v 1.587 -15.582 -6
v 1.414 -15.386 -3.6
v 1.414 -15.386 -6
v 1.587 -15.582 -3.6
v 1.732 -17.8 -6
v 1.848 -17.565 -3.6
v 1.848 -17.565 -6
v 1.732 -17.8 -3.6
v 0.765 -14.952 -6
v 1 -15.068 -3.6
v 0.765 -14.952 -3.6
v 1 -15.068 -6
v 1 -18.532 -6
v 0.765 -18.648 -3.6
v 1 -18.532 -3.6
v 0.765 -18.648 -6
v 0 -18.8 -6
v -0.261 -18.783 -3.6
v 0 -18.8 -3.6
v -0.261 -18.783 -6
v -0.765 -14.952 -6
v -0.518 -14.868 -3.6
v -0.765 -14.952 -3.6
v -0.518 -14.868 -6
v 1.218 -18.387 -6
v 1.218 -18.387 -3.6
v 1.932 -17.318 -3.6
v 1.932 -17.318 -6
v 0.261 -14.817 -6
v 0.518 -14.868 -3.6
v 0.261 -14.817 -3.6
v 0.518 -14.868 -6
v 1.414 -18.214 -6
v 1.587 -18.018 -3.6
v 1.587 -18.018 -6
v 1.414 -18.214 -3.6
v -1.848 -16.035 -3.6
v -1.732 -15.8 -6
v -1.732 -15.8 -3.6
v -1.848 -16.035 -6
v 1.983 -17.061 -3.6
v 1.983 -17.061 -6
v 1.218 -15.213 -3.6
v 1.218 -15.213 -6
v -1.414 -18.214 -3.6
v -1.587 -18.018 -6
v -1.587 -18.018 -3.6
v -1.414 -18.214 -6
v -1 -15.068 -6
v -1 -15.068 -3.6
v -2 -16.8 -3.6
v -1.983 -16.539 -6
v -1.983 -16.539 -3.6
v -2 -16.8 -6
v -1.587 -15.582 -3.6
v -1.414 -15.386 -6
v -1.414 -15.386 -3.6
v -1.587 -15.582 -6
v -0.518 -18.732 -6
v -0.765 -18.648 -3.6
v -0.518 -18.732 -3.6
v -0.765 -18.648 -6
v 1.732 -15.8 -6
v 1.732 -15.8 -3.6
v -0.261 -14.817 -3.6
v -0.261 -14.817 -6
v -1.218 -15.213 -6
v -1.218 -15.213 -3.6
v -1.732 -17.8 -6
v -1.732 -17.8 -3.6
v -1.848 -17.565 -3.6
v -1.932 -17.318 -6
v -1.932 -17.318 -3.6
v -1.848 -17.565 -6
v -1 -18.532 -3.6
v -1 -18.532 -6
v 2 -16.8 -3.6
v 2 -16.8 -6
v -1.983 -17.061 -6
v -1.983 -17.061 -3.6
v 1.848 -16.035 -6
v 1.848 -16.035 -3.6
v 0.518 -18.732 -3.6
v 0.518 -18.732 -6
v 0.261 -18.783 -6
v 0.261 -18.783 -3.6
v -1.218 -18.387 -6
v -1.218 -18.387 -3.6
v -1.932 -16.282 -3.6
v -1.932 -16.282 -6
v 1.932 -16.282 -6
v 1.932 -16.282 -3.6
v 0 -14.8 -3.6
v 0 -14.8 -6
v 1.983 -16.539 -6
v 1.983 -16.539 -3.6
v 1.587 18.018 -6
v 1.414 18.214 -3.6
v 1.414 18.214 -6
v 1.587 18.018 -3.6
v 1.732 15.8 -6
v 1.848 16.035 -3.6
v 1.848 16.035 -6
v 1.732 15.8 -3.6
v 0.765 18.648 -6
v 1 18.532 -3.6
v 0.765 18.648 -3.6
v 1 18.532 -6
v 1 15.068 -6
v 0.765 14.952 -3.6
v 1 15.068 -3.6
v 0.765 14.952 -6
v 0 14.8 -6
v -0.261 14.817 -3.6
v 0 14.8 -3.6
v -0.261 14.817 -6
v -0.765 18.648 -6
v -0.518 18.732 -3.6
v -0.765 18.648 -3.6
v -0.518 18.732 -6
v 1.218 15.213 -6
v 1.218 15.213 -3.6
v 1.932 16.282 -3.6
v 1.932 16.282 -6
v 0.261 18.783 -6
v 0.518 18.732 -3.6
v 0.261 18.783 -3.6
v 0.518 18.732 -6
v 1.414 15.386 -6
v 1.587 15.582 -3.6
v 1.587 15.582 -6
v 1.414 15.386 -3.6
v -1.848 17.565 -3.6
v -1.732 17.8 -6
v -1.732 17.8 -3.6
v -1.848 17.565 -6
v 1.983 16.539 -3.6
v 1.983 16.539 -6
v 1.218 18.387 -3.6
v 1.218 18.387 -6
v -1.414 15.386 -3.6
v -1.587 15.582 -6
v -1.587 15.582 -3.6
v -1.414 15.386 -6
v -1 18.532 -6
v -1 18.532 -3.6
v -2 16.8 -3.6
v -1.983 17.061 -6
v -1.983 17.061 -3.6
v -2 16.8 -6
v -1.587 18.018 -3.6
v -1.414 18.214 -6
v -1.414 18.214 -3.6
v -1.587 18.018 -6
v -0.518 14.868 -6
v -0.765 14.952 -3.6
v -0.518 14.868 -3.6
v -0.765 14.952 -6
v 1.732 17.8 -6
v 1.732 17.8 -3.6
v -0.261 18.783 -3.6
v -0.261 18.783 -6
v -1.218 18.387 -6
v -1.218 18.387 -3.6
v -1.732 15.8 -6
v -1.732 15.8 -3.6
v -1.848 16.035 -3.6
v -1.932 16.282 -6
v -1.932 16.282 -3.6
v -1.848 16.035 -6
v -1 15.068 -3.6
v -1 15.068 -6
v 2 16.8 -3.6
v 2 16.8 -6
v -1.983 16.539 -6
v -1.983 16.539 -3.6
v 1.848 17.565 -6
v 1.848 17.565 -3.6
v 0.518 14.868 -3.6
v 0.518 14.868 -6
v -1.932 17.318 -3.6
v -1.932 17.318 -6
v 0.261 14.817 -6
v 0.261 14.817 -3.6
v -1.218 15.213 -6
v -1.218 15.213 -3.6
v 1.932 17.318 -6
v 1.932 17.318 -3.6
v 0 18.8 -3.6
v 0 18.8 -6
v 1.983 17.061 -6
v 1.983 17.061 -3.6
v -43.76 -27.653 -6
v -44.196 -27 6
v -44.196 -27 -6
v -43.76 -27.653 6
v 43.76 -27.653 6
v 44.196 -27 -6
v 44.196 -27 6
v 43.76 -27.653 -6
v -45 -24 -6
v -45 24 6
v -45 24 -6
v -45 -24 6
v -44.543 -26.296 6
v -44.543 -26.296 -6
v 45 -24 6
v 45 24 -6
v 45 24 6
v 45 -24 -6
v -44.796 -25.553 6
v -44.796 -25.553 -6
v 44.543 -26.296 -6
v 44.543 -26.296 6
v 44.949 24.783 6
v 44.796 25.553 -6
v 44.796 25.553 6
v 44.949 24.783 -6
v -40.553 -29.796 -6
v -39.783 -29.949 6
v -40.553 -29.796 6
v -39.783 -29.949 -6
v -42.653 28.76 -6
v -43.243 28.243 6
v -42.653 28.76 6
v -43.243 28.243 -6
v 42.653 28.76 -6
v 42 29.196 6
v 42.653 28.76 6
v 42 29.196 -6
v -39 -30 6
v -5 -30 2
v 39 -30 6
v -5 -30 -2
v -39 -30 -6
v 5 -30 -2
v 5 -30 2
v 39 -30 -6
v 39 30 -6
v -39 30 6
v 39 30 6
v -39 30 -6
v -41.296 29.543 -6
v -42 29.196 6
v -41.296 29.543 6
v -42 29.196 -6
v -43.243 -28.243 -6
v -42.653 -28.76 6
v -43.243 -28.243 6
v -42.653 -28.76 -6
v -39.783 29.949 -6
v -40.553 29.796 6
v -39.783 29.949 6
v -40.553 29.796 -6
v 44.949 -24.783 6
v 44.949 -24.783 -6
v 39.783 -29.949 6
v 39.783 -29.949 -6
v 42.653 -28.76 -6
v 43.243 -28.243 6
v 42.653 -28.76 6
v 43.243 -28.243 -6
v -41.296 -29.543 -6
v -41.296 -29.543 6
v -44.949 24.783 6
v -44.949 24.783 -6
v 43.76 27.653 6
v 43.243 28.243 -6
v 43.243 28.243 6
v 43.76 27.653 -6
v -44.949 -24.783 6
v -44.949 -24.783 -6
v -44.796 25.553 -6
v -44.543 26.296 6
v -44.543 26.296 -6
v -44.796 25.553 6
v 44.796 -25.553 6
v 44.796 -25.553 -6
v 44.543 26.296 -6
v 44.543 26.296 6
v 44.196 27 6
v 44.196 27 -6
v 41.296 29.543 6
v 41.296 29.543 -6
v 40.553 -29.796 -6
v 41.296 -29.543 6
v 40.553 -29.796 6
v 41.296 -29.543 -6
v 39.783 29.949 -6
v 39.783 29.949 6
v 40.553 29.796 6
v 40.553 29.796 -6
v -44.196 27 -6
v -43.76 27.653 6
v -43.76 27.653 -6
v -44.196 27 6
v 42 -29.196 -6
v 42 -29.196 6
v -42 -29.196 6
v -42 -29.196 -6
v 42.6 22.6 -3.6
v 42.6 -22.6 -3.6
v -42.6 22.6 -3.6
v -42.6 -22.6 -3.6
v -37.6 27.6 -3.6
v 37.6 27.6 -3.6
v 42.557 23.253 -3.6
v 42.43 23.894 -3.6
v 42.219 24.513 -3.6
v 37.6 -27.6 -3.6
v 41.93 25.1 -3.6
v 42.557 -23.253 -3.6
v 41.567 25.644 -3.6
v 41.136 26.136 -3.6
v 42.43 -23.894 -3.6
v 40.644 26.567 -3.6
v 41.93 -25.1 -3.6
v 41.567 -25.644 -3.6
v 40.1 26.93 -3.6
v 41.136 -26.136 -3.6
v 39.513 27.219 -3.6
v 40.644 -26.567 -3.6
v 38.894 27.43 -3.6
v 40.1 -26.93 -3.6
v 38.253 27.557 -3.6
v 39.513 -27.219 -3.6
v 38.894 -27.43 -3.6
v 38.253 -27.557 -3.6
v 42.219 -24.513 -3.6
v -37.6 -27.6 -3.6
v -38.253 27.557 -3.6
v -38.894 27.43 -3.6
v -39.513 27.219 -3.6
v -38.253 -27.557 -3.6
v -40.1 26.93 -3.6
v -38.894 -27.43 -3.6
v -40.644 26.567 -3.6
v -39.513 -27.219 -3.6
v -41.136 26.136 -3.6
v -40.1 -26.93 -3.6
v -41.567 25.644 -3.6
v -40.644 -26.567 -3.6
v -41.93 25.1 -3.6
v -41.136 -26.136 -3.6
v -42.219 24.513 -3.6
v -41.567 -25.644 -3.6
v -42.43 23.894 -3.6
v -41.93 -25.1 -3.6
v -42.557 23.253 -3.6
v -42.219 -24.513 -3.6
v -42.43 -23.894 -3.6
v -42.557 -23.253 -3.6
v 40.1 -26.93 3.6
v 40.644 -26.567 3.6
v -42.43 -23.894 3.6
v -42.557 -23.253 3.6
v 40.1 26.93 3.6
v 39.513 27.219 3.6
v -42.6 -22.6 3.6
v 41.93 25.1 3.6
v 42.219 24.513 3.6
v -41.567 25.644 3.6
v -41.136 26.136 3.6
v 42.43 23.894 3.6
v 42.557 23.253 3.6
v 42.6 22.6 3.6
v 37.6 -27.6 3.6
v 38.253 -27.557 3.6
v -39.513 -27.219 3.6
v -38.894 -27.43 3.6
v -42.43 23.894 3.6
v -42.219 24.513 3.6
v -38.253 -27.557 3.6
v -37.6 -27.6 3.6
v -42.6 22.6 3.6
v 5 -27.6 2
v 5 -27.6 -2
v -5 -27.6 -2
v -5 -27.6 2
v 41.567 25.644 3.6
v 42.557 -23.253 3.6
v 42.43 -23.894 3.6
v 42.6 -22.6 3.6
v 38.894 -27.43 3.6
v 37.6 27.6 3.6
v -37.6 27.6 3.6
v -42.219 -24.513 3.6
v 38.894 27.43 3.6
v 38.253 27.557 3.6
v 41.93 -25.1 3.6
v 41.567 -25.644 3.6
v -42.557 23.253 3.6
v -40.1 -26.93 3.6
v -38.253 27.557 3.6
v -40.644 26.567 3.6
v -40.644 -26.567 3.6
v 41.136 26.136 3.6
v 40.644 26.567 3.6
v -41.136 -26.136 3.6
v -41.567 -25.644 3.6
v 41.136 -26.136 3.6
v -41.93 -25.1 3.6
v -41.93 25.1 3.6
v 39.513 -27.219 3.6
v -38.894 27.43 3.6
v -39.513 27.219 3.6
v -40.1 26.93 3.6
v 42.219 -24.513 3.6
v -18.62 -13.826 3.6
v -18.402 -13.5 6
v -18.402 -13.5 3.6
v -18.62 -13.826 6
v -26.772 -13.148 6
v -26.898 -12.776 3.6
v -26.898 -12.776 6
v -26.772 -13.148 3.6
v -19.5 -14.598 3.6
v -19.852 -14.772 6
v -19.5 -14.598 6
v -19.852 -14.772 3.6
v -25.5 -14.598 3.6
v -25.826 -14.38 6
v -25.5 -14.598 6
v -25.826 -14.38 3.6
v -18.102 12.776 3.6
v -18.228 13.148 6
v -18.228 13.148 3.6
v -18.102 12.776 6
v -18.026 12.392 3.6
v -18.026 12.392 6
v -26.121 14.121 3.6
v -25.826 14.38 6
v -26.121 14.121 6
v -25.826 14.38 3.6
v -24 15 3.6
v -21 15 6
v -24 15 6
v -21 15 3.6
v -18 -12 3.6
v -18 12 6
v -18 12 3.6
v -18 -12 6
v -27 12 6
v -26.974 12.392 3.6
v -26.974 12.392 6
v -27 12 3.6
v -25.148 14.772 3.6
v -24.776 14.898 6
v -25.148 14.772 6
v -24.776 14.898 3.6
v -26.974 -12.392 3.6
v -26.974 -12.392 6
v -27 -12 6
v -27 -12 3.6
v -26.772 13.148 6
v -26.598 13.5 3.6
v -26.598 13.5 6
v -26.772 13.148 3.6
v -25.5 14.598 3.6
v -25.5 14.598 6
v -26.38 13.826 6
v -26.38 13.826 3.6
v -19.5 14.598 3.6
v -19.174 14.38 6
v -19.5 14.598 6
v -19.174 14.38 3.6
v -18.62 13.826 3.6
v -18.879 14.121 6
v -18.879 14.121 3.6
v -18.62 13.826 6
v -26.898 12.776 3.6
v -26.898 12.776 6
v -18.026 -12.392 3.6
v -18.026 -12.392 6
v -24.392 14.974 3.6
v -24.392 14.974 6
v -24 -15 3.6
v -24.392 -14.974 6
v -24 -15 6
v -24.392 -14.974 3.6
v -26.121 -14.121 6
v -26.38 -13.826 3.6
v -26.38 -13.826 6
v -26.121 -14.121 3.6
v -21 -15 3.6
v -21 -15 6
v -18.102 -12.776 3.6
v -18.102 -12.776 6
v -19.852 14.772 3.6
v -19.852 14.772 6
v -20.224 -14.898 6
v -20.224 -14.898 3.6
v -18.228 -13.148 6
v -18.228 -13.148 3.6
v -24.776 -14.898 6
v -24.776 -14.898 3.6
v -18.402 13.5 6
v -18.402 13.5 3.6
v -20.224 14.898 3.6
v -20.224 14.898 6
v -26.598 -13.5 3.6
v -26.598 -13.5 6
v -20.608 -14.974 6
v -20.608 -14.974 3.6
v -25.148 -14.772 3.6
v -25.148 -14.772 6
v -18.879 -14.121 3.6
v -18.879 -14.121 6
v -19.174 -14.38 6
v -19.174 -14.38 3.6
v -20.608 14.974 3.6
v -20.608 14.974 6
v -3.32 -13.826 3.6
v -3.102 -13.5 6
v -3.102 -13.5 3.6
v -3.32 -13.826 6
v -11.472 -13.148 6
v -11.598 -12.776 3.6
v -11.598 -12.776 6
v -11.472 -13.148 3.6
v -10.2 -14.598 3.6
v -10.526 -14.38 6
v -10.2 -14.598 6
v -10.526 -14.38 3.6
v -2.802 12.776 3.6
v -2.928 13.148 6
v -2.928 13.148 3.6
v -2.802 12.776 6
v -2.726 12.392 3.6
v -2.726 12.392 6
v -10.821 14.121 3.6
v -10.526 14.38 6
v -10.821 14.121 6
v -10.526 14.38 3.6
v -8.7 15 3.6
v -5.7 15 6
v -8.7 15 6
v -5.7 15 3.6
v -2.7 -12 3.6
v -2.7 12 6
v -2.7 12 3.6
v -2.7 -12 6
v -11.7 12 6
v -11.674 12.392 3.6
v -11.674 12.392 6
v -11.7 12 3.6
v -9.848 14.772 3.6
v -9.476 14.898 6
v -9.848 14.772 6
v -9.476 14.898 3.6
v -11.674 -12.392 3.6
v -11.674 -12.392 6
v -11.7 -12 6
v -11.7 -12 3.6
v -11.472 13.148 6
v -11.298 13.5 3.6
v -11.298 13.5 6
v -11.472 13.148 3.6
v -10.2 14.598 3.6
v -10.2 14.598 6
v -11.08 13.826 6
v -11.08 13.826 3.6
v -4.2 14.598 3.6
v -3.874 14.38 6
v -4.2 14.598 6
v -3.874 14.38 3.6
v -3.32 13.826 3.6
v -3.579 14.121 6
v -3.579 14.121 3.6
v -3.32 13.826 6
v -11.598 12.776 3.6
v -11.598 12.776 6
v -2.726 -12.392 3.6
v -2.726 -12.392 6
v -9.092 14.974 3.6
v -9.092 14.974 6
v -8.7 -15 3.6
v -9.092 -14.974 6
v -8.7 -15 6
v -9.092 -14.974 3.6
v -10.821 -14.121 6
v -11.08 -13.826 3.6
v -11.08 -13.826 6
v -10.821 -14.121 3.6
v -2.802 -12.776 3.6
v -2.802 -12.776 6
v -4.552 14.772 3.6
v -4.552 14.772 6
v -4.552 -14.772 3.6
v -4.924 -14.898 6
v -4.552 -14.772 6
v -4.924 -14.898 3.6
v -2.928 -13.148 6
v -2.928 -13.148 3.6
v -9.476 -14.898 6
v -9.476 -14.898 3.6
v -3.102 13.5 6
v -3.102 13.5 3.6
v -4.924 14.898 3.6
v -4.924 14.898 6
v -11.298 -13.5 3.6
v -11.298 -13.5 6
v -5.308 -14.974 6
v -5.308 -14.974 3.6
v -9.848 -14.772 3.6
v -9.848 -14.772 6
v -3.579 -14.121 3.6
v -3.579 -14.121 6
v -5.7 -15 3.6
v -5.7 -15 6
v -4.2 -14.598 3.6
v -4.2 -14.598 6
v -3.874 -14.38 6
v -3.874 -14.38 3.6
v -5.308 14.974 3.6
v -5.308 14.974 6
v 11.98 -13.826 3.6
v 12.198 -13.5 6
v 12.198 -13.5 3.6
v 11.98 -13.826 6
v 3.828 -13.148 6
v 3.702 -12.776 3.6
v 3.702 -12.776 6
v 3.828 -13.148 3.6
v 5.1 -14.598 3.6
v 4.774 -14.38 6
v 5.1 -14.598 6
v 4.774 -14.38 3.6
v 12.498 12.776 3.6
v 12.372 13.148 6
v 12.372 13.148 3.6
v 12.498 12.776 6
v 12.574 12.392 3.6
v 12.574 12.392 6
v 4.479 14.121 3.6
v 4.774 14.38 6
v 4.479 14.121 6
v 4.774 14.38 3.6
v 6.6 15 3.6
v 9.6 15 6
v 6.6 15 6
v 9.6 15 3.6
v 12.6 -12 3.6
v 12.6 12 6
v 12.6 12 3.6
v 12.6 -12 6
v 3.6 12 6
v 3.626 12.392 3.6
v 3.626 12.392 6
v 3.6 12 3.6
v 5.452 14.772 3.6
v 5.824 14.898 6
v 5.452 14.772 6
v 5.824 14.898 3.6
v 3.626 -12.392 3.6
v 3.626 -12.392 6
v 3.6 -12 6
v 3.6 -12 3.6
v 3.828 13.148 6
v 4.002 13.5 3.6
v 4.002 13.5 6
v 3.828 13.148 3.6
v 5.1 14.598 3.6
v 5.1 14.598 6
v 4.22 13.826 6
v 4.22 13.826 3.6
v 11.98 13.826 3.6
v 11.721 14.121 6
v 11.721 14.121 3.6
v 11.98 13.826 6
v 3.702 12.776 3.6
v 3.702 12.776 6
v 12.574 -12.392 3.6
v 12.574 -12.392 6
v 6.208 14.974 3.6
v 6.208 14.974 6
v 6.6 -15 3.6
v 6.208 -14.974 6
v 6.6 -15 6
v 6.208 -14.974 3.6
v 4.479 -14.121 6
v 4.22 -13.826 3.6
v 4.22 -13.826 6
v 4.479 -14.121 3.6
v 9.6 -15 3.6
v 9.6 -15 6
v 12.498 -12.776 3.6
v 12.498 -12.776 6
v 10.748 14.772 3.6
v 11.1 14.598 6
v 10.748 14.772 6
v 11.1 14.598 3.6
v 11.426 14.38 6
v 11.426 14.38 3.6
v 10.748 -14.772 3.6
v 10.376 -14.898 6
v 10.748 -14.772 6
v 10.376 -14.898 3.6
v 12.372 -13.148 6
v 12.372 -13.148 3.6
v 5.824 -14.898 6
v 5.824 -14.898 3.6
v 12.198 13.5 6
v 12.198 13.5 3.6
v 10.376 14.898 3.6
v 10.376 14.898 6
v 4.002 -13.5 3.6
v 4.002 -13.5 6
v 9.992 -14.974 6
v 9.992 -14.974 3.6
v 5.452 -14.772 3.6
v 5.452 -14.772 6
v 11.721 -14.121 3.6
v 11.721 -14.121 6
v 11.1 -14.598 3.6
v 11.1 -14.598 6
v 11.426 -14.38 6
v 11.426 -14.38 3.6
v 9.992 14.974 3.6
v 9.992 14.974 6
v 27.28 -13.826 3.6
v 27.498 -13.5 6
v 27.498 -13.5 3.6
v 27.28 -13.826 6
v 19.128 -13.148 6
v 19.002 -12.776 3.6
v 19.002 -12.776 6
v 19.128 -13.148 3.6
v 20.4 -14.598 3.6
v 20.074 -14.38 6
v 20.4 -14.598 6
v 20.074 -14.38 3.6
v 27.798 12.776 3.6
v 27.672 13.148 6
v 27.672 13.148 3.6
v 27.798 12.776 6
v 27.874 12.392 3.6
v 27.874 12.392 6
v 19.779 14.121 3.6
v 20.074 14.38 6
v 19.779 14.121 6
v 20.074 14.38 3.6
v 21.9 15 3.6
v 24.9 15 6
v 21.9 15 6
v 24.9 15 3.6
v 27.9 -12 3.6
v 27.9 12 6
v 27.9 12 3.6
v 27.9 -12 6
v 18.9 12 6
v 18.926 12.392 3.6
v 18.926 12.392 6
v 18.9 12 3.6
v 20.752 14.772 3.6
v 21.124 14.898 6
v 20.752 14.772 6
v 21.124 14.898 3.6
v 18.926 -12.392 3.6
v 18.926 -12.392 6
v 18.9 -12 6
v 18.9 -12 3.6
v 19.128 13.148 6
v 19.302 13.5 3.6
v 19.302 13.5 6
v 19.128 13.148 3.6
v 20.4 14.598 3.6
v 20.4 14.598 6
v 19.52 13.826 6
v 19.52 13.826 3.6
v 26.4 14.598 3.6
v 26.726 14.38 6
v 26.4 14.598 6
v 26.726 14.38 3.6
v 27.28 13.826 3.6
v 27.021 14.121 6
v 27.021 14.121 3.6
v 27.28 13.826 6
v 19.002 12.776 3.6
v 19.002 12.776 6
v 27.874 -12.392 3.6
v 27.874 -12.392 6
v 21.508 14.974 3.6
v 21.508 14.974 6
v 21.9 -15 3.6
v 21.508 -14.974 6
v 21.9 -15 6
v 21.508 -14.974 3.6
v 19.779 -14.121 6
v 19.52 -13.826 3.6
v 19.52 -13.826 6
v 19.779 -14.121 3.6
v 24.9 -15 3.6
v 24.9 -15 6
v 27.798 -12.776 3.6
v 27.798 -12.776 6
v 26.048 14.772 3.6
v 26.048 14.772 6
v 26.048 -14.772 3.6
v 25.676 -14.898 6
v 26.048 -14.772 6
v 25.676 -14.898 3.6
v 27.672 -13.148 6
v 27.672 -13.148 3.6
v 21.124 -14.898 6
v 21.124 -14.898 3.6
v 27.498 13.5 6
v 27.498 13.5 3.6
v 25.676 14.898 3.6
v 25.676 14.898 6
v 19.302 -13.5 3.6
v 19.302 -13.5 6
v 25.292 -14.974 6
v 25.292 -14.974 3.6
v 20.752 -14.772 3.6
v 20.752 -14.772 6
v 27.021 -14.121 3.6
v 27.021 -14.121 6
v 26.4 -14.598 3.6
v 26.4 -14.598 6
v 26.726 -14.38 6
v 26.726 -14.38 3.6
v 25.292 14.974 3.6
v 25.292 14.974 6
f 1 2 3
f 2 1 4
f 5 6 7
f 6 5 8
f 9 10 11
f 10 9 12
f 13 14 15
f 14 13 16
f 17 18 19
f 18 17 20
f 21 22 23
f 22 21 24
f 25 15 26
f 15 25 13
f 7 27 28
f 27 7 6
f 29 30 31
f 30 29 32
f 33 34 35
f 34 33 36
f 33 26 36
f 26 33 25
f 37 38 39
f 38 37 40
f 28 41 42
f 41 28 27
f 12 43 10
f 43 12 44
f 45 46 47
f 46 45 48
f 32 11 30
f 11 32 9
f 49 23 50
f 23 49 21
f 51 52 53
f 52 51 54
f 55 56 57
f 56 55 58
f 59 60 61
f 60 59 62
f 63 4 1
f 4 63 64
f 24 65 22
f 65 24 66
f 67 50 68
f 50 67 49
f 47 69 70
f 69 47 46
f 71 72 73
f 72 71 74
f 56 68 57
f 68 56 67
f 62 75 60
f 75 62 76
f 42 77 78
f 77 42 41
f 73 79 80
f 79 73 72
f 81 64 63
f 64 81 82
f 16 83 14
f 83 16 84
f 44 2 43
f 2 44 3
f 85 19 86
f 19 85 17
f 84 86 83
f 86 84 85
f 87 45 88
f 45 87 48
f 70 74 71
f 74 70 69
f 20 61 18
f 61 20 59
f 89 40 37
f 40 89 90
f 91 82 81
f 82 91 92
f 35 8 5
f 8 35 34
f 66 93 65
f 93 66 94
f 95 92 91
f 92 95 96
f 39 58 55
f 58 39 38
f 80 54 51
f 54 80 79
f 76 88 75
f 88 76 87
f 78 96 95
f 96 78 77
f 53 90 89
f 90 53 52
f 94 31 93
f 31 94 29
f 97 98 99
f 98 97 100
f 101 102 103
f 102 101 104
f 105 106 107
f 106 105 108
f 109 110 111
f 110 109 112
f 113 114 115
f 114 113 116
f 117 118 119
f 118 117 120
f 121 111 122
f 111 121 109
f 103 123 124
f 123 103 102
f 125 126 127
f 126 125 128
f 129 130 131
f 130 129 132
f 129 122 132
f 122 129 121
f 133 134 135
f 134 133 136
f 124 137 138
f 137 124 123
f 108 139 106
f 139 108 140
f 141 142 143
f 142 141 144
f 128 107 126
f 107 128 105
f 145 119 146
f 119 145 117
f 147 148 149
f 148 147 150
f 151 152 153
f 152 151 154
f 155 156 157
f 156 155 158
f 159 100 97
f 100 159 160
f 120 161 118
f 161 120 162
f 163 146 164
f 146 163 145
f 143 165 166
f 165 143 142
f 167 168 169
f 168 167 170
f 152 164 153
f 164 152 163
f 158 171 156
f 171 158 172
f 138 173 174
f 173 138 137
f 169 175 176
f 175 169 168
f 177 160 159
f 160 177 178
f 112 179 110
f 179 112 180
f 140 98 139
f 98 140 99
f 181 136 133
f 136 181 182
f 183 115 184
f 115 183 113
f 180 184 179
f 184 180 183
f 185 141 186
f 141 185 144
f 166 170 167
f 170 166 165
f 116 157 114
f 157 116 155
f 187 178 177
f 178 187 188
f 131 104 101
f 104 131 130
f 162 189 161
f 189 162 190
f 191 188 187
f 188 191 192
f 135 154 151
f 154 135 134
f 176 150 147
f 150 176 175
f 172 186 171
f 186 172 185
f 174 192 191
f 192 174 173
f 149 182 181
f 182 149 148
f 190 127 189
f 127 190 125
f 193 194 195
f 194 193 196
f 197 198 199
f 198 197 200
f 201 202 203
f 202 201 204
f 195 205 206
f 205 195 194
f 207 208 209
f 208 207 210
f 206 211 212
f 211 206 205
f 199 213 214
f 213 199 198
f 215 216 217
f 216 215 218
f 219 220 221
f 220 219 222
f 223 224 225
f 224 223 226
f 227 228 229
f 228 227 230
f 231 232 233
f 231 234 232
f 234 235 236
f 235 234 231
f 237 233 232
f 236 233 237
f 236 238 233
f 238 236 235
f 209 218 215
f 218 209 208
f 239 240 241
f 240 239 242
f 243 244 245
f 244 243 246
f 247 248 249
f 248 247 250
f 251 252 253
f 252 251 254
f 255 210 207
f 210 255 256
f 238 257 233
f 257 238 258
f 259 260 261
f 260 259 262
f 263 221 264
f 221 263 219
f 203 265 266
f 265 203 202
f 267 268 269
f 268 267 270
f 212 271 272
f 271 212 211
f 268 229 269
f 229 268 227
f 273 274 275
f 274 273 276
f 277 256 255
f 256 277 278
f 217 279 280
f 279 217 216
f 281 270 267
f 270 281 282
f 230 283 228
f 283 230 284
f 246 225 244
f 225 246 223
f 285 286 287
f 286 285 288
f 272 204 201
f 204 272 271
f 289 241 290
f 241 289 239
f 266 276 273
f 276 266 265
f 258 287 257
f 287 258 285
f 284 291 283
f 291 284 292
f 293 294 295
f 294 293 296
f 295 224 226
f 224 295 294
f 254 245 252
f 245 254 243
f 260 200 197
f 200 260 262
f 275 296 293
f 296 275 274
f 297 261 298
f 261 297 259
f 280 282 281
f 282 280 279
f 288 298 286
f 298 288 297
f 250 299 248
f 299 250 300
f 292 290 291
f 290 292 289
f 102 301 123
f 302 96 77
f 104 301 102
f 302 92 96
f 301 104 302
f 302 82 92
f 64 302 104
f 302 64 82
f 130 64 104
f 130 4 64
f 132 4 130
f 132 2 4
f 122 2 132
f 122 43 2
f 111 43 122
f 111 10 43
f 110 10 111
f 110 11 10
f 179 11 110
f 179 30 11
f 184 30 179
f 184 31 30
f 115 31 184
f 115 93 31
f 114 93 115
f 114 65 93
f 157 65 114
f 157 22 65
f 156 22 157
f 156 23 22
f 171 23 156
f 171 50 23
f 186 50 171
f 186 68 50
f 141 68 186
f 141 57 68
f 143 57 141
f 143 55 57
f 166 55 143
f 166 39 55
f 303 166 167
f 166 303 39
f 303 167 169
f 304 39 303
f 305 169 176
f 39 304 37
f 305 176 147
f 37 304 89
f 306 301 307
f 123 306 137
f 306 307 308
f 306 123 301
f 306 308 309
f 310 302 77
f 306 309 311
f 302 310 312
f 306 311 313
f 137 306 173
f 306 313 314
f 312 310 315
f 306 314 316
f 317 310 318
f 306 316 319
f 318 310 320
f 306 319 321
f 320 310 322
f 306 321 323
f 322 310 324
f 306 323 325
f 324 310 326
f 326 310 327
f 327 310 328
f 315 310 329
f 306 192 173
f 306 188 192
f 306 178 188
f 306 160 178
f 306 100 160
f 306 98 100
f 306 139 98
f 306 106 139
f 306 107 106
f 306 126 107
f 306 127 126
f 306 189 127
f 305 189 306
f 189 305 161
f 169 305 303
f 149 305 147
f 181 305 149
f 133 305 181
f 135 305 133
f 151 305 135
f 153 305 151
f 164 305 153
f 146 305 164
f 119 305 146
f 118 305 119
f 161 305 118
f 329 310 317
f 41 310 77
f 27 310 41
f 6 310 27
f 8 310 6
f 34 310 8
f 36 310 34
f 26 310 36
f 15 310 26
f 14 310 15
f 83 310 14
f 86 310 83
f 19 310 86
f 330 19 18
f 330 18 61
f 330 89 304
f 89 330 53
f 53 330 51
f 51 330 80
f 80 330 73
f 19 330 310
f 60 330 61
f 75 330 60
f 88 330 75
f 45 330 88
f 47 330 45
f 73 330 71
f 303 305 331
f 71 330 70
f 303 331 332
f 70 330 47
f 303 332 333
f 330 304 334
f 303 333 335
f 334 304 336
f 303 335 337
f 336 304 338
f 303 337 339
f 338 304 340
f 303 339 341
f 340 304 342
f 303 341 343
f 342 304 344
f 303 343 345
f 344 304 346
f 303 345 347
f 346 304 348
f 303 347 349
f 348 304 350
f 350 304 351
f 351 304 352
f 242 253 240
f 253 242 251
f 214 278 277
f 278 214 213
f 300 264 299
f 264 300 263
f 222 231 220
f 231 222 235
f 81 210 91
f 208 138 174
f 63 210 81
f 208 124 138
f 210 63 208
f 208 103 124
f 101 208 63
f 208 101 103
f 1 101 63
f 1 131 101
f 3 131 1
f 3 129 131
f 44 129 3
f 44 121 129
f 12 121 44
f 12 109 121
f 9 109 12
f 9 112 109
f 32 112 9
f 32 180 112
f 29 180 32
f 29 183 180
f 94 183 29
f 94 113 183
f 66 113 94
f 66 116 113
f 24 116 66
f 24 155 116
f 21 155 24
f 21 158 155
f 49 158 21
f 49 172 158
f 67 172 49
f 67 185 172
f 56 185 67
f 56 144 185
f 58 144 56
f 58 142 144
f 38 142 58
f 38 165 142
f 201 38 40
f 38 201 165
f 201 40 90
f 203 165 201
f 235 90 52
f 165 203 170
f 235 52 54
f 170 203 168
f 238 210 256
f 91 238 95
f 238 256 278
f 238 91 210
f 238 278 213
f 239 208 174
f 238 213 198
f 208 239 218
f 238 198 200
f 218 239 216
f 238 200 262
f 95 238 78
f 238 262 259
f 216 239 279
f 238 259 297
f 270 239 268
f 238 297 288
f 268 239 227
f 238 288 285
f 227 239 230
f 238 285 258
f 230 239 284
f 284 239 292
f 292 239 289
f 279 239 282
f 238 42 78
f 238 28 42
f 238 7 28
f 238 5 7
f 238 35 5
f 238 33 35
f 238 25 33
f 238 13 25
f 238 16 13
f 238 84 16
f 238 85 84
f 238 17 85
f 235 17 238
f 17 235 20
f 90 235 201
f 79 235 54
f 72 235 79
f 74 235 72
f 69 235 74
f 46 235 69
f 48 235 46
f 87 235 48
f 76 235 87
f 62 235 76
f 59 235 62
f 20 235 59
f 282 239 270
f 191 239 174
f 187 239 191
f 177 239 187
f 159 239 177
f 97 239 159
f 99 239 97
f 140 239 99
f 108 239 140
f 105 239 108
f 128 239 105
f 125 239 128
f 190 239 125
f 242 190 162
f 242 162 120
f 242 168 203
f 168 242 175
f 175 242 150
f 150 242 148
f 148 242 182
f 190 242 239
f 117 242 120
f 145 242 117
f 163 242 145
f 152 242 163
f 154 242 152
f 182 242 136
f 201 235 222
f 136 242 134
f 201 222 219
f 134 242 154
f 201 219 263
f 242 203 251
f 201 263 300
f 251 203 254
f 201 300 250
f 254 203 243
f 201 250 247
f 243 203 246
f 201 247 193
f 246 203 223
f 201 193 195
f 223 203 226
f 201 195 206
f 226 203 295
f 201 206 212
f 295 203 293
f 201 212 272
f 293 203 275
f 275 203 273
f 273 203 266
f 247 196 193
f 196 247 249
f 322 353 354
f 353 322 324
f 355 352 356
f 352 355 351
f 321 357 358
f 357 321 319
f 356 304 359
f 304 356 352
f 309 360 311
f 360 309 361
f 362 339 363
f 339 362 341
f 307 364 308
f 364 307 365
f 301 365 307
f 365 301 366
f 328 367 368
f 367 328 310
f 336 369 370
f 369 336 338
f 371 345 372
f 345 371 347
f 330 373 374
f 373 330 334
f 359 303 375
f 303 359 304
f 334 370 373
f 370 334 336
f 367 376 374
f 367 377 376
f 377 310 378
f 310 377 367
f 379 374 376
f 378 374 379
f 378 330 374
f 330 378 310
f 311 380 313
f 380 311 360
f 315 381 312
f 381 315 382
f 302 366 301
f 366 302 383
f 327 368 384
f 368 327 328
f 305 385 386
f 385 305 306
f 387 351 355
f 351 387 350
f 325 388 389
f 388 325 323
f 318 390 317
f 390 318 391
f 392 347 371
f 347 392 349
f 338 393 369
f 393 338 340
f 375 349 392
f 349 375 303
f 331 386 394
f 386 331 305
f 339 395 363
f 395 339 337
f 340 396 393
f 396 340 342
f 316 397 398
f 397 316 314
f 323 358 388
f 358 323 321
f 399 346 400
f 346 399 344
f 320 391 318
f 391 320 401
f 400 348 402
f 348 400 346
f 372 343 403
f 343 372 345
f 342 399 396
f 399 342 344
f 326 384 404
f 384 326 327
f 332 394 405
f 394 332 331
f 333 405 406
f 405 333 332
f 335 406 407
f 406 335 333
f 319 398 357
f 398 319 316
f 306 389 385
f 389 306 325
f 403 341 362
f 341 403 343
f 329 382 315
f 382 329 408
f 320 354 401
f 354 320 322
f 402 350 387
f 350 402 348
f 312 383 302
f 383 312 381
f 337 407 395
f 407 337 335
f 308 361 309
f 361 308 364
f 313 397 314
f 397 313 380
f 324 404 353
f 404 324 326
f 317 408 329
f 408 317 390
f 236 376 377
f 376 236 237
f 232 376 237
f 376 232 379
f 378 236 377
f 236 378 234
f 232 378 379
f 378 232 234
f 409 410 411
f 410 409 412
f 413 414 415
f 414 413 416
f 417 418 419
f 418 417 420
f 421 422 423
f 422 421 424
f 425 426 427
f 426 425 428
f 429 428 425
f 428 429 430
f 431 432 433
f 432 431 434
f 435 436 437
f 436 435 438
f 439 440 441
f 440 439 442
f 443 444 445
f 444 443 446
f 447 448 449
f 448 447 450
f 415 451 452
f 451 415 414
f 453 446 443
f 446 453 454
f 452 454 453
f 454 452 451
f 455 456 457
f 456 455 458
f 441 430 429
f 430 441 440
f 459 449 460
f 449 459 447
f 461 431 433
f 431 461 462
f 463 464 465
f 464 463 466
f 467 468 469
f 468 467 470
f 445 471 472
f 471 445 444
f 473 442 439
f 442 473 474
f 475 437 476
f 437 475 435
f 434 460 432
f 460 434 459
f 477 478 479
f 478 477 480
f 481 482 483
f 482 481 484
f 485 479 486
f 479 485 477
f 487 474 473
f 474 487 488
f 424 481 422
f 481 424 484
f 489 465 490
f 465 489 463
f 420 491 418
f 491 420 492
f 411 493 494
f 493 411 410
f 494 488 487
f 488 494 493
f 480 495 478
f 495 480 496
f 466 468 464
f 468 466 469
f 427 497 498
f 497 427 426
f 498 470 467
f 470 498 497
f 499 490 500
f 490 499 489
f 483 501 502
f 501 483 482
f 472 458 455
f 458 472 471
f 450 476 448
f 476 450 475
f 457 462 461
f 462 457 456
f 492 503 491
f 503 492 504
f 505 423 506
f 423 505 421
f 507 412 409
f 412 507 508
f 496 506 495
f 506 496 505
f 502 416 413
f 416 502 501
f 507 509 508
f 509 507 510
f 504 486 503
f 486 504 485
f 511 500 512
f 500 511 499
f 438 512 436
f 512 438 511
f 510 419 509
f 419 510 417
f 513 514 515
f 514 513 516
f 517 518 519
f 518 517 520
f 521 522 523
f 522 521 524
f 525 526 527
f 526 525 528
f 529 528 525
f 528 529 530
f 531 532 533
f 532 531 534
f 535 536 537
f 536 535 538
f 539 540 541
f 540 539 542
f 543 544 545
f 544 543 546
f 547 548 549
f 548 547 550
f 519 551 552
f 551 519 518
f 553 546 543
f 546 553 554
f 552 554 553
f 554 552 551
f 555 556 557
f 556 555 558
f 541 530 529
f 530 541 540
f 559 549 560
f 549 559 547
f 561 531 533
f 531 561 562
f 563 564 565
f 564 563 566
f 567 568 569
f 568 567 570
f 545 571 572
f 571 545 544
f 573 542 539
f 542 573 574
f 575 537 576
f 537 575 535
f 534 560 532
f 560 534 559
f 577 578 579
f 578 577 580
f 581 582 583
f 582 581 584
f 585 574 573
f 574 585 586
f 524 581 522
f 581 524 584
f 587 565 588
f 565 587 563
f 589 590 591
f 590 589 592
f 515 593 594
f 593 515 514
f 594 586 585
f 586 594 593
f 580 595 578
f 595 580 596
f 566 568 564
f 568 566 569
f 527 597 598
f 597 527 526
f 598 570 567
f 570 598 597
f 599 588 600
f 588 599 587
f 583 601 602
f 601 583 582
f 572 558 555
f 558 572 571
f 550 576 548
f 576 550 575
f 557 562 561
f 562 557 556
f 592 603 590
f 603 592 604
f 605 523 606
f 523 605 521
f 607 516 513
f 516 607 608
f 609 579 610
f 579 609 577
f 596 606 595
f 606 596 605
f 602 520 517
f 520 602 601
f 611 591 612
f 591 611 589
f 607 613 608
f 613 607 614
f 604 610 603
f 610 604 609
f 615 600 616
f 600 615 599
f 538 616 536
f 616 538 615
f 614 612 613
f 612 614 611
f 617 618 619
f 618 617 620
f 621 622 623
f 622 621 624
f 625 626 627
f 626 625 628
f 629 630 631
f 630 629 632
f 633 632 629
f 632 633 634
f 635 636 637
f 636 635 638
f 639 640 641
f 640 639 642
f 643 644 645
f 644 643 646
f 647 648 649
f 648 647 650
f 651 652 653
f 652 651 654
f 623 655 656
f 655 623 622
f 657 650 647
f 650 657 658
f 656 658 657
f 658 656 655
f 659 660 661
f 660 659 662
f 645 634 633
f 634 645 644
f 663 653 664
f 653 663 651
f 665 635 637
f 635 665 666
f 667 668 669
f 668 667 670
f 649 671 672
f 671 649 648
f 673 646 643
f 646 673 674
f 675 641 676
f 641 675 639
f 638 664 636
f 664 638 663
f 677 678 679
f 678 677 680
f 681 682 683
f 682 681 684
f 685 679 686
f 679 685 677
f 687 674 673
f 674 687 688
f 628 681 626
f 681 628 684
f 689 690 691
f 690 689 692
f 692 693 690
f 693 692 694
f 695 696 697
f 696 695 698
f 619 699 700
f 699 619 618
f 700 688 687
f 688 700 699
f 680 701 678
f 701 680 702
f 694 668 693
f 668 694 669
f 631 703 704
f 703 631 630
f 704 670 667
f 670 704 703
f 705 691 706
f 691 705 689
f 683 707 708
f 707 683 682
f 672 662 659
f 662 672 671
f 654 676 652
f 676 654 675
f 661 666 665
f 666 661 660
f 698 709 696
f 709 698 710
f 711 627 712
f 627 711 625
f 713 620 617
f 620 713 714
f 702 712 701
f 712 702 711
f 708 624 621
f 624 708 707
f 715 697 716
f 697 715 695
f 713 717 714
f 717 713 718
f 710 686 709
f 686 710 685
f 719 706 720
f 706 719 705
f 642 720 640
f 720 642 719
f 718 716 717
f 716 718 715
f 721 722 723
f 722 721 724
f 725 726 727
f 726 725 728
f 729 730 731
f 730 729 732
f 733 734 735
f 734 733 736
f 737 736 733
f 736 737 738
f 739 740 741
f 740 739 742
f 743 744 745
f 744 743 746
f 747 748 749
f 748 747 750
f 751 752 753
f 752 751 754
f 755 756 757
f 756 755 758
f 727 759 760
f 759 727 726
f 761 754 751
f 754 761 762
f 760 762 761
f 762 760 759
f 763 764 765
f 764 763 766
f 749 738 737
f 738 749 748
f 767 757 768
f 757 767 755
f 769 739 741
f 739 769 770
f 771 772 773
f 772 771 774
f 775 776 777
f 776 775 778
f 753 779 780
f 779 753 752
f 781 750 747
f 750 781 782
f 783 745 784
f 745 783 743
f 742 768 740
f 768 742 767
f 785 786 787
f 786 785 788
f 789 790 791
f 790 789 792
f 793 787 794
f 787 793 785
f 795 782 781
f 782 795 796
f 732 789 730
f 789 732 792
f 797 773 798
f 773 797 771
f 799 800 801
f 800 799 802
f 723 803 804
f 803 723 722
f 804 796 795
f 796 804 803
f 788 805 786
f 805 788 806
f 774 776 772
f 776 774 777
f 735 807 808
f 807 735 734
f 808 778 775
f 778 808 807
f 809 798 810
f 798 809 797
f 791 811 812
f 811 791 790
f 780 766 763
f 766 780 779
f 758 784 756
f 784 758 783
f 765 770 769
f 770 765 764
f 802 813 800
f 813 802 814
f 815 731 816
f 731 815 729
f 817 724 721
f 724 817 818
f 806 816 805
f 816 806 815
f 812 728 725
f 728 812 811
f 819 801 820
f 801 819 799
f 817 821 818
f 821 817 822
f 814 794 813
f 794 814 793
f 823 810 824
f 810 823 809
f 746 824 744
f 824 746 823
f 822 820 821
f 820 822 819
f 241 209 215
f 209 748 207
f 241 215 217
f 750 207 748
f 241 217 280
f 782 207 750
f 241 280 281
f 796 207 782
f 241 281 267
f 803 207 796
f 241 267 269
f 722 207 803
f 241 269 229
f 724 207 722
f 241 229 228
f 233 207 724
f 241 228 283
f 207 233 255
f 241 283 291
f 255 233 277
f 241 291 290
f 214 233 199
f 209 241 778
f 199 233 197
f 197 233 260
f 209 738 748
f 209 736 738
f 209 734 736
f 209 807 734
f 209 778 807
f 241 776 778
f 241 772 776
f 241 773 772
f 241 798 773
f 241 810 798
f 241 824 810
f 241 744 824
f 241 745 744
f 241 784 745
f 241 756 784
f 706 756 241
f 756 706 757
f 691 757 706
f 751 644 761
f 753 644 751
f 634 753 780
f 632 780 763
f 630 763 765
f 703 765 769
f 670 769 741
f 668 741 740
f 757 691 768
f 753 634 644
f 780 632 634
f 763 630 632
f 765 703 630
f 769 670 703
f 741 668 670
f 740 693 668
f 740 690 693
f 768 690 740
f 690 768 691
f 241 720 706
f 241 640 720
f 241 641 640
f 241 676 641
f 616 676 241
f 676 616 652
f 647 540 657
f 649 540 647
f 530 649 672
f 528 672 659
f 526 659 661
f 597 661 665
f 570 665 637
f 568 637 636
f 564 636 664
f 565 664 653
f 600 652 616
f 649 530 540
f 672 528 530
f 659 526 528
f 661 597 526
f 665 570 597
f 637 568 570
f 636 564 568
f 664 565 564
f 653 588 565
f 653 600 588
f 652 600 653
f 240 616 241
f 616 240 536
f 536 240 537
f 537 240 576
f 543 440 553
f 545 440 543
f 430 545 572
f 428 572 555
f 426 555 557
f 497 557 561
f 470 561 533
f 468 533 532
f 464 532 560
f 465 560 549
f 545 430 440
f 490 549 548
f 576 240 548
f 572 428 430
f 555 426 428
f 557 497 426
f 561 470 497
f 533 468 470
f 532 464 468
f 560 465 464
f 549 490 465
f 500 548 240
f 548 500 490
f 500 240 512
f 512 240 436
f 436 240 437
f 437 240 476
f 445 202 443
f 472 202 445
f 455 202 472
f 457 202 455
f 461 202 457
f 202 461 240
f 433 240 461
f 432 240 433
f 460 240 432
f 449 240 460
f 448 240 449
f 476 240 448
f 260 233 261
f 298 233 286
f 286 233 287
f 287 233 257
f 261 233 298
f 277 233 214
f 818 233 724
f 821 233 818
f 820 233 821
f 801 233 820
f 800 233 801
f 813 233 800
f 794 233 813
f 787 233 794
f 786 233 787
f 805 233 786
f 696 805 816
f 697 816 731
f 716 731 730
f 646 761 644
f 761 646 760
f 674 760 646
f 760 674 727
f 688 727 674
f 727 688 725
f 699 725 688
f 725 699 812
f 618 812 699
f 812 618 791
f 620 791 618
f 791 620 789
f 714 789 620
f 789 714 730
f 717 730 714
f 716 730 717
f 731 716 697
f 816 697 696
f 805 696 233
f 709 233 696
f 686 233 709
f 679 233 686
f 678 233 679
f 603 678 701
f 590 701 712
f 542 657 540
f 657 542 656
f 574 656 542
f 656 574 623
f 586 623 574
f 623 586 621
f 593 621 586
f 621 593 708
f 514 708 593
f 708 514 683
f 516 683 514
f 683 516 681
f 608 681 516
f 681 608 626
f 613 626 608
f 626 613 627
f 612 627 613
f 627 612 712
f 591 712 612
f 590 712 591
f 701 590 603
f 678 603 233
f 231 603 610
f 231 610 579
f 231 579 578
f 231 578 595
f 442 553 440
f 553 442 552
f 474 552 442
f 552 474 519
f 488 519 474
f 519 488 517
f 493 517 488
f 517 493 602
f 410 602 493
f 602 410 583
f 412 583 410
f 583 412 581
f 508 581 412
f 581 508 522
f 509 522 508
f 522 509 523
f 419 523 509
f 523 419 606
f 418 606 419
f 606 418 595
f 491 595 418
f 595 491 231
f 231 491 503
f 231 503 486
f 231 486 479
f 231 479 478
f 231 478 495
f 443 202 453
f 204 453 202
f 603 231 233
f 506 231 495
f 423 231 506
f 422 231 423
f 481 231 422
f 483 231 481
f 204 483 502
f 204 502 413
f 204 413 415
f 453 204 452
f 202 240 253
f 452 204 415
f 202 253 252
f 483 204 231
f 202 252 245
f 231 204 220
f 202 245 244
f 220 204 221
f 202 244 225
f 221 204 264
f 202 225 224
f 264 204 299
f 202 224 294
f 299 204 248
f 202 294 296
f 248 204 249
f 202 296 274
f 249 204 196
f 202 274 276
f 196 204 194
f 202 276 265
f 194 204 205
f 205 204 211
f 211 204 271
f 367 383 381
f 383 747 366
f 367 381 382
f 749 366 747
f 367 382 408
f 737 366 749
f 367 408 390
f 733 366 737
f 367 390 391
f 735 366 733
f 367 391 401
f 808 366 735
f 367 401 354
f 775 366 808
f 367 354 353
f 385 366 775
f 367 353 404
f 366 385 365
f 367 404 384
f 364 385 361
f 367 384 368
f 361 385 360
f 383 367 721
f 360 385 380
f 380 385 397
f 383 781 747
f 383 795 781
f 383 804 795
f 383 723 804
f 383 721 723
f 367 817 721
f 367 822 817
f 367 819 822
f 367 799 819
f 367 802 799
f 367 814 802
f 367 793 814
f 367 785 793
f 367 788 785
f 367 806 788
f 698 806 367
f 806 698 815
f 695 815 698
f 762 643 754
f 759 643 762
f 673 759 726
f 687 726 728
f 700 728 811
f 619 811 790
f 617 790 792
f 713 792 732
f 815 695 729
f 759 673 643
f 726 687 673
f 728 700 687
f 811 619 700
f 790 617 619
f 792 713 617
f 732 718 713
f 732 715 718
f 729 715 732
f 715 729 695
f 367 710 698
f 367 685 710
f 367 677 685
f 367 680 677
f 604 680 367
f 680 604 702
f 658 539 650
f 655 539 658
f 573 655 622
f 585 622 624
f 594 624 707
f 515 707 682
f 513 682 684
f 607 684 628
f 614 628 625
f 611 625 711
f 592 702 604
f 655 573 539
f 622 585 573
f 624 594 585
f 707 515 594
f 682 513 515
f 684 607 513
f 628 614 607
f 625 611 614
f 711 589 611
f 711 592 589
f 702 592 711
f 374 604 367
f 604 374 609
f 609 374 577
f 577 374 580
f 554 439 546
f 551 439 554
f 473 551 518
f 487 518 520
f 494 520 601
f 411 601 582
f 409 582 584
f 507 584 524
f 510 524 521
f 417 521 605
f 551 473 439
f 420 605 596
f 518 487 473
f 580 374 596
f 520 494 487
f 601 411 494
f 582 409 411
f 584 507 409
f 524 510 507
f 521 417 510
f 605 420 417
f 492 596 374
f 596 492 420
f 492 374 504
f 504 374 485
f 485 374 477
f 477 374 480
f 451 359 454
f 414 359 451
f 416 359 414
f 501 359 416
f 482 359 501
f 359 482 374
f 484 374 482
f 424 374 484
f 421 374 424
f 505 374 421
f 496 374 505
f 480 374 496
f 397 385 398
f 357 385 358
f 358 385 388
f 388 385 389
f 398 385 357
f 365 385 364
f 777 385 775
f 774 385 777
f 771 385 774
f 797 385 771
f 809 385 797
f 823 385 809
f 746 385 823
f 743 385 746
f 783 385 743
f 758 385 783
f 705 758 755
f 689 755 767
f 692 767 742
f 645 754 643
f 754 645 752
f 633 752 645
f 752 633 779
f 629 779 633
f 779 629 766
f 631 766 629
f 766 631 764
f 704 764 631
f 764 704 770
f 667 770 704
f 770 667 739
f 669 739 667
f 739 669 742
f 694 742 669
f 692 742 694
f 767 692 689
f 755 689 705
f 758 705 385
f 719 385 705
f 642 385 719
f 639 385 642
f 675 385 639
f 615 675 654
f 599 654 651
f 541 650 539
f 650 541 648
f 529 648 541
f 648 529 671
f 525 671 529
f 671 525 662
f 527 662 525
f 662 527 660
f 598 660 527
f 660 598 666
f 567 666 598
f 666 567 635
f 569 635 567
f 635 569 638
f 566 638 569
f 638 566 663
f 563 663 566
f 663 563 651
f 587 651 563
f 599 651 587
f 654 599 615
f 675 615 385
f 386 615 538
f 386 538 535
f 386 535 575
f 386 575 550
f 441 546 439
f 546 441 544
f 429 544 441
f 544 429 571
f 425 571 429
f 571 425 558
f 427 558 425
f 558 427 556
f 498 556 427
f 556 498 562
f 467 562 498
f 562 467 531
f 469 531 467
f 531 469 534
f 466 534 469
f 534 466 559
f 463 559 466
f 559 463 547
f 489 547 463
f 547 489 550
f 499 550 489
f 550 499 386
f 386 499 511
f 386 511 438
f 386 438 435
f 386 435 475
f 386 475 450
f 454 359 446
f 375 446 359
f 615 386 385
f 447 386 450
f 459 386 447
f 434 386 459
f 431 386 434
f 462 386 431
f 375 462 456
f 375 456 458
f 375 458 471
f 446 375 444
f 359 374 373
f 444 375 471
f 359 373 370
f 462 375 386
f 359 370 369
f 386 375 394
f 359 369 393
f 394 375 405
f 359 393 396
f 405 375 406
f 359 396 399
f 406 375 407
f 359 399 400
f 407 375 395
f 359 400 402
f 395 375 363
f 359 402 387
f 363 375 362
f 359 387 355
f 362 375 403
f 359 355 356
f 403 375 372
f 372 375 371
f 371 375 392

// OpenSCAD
// Cortana-Chip - körpergetragenes Daten-Dock (Konzept).
// Enthält Innenausschnitt für ESP32-S3-WROOM, ST60-Freiraum und USB-Zugang.
// Einheit mm. OpenSCAD 2021.01+. Keine Passfreigabe, keine Lastfreigabe.

// ---- Parameter ----
chip_w = 90;          // Breite des Cortana-Chips (MakerWorld-Referenz)
chip_h = 60;          // Höhe
chip_d = 12;          // Dicke
wall = 2.4;           // Wandstärke
corner_r = 6;         // Eckenradius

// Elektronik (ESP32-S3-WROOM-1-N8R8: 18x25.5x3.1 mm + Antennenfreiraum)
esp_w = 18.0;
esp_l = 25.5;
esp_h = 3.4;
esp_clearance = 1.0;  // Spiel rund um das Modul
antenna_free = 6.0;   // Freiraum über der Antennenseite (kein Filament)

// ST60-Modul (Evaluationsboard grob 20x15 mm, Platz für PCB-Design)
st60_w = 20.0;
st60_l = 15.0;
st60_h = 2.0;
st60_clearance = 2.0;

// USB-C-Öffnung
usb_w = 10.0;
usb_h = 4.0;

// Befestigung: zwei Gurtschlitze hinten
strap_slot_w = 22.0;
strap_slot_h = 4.0;

$fn = 48;

c_case = [0.18, 0.55, 0.62];
c_dark = [0.10, 0.13, 0.15];
c_glow = [0.30, 0.85, 0.90];

// ---- Hilfsbausteine ----
module rounded_plate(w, d, h, r) {
    assert(w > 2*r && d > 2*r && h > 0, "Ungültige Plattenmaße");
    linear_extrude(height=h, center=true)
        hull() for(x=[-w/2+r, w/2-r], y=[-d/2+r, d/2-r])
            translate([x, y]) circle(r=r);
}

module strap_slot() {
    hull() for(x=[-strap_slot_w/2+strap_slot_h/2, strap_slot_w/2-strap_slot_h/2])
        cylinder(h=chip_d*3, d=strap_slot_h, center=true);
}

// ---- Gehäuse: Rückplatte + Rahmen ----
module case_back() {
    color(c_dark) difference() {
        rounded_plate(chip_w, chip_h, wall, corner_r);
        // Gurtschlitze
        for(sy=[-1, 1])
            translate([0, sy*(chip_h*0.28), 0]) strap_slot();
    }
}

module case_frame() {
    // Rahmen mit Innenausschnitt für Elektronik
    color(c_case) difference() {
        difference() {
            rounded_plate(chip_w, chip_h, chip_d-wall, corner_r);
            translate([0, 0, 0])
                rounded_plate(chip_w-2*wall, chip_h-2*wall, chip_d, corner_r-1);
        }
        // ESP32-Bauraum
        translate([-chip_w*0.18, chip_h*0.10, 0])
            cube([esp_w+2*esp_clearance, esp_l+2*esp_clearance, chip_d*2], center=true);
        // Antennenfenster: freier Bereich über ESP-Antenne
        translate([-chip_w*0.18, chip_h*0.10 + esp_l/2 + antenna_free/2, 0])
            cube([esp_w+2*esp_clearance, antenna_free, chip_d*2], center=true);
        // ST60-Bauraum (nahe Oberkante, Richtung Display)
        translate([chip_w*0.20, chip_h*0.28, 0])
            cube([st60_w+2*st60_clearance, st60_l+2*st60_clearance, chip_d*2], center=true);
        // USB-C-Öffnung an der Unterseite
        translate([0, -chip_h/2+wall/2, 0])
            cube([usb_w, wall*3, usb_h], center=true);
    }
}

// Frontplatte mit "Chip-Glow"-Ausschnitt (optional, Deko)
module case_front() {
    color(c_glow, 0.6) difference() {
        rounded_plate(chip_w, chip_h, wall, corner_r);
        for(i=[0:3])
            translate([-chip_w*0.25 + i*chip_w*0.17, 0, 0])
                rounded_plate(chip_w*0.10, chip_h*0.5, wall*3, 3);
    }
}

// Montage: alles zusammen (Vorschau)
module assembly() {
    translate([0, 0, -chip_d/2+wall/2]) case_back();
    case_frame();
    translate([0, 0, chip_d/2-wall/2]) case_front();
}

part = "assembly"; // assembly|back|frame|front
if (part == "assembly") assembly();
else if (part == "back") case_back();
else if (part == "frame") case_frame();
else if (part == "front") case_front();
else assert(false, "Unbekannter part-Wert");
